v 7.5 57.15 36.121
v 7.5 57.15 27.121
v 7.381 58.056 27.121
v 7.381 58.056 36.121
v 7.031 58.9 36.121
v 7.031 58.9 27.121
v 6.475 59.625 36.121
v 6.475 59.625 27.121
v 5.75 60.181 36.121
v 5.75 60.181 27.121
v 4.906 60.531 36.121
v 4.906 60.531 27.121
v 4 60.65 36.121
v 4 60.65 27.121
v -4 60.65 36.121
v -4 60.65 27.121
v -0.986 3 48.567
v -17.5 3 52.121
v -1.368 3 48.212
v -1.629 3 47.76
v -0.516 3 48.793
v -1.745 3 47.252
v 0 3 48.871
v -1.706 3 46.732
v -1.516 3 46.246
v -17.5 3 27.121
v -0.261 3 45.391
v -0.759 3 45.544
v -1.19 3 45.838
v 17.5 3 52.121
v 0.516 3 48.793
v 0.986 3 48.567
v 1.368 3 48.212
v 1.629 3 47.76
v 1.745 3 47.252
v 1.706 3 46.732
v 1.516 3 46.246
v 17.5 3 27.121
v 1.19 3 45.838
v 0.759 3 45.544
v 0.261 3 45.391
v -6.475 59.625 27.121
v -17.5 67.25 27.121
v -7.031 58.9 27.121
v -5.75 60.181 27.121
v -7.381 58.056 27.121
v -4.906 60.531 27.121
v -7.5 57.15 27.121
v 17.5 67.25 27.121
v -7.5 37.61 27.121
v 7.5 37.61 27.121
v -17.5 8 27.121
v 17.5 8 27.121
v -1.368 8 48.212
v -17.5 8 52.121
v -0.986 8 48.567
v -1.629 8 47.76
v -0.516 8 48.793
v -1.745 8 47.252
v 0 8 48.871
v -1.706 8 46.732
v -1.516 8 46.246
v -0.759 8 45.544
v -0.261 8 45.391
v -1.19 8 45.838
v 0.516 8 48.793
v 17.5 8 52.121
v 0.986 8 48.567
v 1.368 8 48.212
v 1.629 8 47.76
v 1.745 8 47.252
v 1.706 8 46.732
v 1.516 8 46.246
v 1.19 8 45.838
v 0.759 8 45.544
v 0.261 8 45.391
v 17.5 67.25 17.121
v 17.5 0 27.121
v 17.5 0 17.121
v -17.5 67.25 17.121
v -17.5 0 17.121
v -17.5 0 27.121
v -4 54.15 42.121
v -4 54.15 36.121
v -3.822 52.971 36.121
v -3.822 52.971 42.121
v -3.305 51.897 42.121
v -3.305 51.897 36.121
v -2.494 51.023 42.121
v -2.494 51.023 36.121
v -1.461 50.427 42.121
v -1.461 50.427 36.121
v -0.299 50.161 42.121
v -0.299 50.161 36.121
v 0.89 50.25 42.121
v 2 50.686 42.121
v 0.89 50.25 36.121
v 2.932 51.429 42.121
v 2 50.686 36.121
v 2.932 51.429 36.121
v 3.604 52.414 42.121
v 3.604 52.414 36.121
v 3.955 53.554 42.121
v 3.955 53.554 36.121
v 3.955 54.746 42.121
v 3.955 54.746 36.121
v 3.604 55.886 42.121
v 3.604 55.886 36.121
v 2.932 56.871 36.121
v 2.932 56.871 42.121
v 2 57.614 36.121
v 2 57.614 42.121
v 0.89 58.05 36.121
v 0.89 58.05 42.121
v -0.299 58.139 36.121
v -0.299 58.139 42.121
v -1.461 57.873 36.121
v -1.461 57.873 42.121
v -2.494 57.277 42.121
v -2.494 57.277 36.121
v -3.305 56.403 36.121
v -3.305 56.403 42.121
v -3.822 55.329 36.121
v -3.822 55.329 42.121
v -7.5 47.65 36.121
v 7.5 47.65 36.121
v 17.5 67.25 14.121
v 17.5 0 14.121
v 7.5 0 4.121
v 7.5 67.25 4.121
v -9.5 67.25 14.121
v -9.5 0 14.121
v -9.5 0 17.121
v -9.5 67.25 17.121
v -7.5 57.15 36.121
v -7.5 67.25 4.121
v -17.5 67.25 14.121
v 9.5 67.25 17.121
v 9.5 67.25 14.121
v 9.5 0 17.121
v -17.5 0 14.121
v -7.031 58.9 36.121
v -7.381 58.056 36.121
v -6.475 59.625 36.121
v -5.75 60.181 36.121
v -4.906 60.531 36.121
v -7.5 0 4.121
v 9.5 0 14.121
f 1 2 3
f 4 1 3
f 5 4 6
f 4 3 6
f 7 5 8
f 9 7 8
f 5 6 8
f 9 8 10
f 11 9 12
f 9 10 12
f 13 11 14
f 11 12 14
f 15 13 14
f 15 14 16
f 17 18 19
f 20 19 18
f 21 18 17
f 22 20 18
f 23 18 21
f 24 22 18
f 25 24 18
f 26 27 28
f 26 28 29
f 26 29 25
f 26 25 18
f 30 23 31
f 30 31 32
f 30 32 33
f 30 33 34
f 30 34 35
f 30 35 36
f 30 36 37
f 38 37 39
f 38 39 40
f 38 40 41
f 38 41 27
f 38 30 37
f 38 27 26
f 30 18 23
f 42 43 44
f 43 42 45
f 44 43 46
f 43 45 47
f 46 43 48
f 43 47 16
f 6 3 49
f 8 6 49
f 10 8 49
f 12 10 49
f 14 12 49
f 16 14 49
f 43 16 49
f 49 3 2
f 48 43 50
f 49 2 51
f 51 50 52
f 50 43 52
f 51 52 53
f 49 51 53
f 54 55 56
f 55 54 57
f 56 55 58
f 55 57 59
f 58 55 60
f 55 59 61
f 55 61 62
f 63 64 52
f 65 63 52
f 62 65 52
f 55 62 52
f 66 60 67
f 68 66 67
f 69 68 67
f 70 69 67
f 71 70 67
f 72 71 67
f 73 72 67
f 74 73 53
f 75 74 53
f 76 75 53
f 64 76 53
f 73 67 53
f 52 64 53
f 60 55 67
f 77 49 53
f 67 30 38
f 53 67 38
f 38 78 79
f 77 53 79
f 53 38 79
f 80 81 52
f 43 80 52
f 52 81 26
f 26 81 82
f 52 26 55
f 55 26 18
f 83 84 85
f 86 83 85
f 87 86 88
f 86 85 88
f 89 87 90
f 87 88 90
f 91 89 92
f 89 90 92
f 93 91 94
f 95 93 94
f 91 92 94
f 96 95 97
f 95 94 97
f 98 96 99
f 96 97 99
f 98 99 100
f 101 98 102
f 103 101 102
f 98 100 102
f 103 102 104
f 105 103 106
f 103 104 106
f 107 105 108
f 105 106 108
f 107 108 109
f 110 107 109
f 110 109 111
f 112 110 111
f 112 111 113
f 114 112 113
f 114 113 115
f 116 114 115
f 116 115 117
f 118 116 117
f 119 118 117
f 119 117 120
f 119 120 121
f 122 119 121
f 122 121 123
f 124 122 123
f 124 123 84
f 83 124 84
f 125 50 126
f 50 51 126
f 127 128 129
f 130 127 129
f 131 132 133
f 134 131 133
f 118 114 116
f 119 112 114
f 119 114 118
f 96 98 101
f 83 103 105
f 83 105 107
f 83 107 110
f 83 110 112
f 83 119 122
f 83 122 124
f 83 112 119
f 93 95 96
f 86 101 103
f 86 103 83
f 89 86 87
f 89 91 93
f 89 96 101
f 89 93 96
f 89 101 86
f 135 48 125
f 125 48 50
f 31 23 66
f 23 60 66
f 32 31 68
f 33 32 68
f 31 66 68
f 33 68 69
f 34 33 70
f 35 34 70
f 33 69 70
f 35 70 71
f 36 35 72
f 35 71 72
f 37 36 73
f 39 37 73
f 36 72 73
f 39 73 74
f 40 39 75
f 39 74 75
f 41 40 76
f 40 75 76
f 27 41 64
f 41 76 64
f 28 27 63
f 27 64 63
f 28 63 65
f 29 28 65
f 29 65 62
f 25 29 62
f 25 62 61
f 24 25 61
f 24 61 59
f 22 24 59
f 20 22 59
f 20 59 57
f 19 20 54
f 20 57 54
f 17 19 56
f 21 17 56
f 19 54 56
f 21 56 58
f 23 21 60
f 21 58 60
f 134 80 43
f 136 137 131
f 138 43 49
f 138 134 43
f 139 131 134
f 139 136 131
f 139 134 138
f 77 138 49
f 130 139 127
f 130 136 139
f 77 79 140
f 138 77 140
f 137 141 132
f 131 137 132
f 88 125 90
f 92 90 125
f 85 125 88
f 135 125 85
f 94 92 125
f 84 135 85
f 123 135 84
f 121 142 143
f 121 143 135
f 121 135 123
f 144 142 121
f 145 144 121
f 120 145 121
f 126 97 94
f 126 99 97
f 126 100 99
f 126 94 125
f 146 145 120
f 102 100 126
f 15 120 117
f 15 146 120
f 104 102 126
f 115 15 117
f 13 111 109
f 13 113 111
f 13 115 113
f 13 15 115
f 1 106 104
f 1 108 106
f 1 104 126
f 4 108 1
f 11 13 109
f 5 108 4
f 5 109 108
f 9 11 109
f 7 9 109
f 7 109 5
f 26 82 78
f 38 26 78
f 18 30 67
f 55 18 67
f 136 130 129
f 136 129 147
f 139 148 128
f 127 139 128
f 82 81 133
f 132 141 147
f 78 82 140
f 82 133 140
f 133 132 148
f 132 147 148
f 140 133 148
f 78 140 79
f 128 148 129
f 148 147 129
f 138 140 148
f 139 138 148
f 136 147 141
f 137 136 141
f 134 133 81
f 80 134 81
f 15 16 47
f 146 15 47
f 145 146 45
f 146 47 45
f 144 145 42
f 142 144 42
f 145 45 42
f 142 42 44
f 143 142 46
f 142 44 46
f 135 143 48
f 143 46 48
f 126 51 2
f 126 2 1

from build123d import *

# Parameters (mm, degrees)
SALIENTE_EXTRUIR1_DEPTH  = 67.25
CROQUIS7_R               = 4
SALIENTE_EXTRUIR2_DEPTH  = 15
SALIENTE_EXTRUIR9_DEPTH  = 7.5
CROQUIS15_R              = 4
SALIENTE_EXTRUIR15_DEPTH = 9
CROQUIS17_W              = 25
CROQUIS17_H              = 5
SALIENTE_EXTRUIR16_DEPTH = 17.5
CROQUIS18_R              = 1.75
CORTAR_EXTRUIR3_DEPTH    = 7.5


with BuildPart() as part:
    # Croquis2 → Saliente-Extruir1 (new body)
    with BuildSketch(Plane(origin=(0, 0, 0), x_dir=(1, 0, 0), z_dir=(0, 1, 0))):
        Polygon((-17.5, -27.121137051), (17.5, -27.121137051), (17.5, -17.121137051), (9.5, -17.121137051), (9.5, -14.121137051), (17.5, -14.121137051), (7.5, -4.121137051), (-7.5, -4.121137051), (-17.5, -14.121137051), (-9.5, -14.121137051), (-9.5, -17.121137051), (-17.5, -17.121137051), align=None)
    extrude(amount=SALIENTE_EXTRUIR1_DEPTH)

    # Croquis7 → Saliente-Extruir2 (add)
    with BuildSketch(Plane.XY.offset(27.121137051)):
        with Locations(Location((0, 54.15, 0), (0, 0, 180))):
            Circle(CROQUIS7_R)
    extrude(amount=SALIENTE_EXTRUIR2_DEPTH)



with BuildPart() as body_2:
    # Croquis8 → Saliente-Extruir9 (new, symmetric)
    with BuildSketch(Plane(origin=(0, 0, 0), x_dir=(0, 0, -1), z_dir=(1, 0, 0))):
        Polygon((-36.121137051, 47.65), (-30.523413607, 47.65), (-27.121137051, 47.65), (-27.121137051, 37.610022974), align=None)
    extrude(amount=SALIENTE_EXTRUIR9_DEPTH, both=True)


with BuildPart() as part_1:
    add(part.part)

    add(body_2.part)  # Saliente-Extruir15 merges body 2
    # Croquis15 → Saliente-Extruir15 (add)
    with BuildSketch(Plane.XY.offset(27.121137051)):
        with BuildLine():
            Line((-7.5, 47.65), (7.5, 47.65))
            Line((7.5, 47.65), (7.5, 57.15))
            ThreePointArc((7.5, 57.15), (6.474873734, 59.624873734), (4, 60.65))
            Line((4, 60.65), (-4, 60.65))
            ThreePointArc((-4, 60.65), (-6.474873734, 59.624873734), (-7.5, 57.15))
            Line((-7.5, 57.15), (-7.5, 47.65))
        make_face()
        with Locations(Location((0, 54.15, 0), (0, 0, 180))):
            Circle(CROQUIS15_R, mode=Mode.SUBTRACT)
    extrude(amount=SALIENTE_EXTRUIR15_DEPTH)

    # Croquis17 → Saliente-Extruir16 (add, symmetric)
    with BuildSketch(Plane(origin=(0, 0, 0), x_dir=(0, 0, -1), z_dir=(1, 0, 0))):
        with Locations((-39.621137051, 5.5)):
            Rectangle(CROQUIS17_W, CROQUIS17_H)
    extrude(amount=SALIENTE_EXTRUIR16_DEPTH, both=True)

    # Croquis18 → Cortar-Extruir3 (cut, symmetric)
    with BuildSketch(Plane(origin=(0, 8, 0), x_dir=(1, 0, 0), z_dir=(0, 1, 0))):
        with Locations(Location((0, -47.121137051, 0), (0, 0, 270))):
            Circle(CROQUIS18_R)
    extrude(amount=CORTAR_EXTRUIR3_DEPTH, both=True, mode=Mode.SUBTRACT)


solid = part_1.part
